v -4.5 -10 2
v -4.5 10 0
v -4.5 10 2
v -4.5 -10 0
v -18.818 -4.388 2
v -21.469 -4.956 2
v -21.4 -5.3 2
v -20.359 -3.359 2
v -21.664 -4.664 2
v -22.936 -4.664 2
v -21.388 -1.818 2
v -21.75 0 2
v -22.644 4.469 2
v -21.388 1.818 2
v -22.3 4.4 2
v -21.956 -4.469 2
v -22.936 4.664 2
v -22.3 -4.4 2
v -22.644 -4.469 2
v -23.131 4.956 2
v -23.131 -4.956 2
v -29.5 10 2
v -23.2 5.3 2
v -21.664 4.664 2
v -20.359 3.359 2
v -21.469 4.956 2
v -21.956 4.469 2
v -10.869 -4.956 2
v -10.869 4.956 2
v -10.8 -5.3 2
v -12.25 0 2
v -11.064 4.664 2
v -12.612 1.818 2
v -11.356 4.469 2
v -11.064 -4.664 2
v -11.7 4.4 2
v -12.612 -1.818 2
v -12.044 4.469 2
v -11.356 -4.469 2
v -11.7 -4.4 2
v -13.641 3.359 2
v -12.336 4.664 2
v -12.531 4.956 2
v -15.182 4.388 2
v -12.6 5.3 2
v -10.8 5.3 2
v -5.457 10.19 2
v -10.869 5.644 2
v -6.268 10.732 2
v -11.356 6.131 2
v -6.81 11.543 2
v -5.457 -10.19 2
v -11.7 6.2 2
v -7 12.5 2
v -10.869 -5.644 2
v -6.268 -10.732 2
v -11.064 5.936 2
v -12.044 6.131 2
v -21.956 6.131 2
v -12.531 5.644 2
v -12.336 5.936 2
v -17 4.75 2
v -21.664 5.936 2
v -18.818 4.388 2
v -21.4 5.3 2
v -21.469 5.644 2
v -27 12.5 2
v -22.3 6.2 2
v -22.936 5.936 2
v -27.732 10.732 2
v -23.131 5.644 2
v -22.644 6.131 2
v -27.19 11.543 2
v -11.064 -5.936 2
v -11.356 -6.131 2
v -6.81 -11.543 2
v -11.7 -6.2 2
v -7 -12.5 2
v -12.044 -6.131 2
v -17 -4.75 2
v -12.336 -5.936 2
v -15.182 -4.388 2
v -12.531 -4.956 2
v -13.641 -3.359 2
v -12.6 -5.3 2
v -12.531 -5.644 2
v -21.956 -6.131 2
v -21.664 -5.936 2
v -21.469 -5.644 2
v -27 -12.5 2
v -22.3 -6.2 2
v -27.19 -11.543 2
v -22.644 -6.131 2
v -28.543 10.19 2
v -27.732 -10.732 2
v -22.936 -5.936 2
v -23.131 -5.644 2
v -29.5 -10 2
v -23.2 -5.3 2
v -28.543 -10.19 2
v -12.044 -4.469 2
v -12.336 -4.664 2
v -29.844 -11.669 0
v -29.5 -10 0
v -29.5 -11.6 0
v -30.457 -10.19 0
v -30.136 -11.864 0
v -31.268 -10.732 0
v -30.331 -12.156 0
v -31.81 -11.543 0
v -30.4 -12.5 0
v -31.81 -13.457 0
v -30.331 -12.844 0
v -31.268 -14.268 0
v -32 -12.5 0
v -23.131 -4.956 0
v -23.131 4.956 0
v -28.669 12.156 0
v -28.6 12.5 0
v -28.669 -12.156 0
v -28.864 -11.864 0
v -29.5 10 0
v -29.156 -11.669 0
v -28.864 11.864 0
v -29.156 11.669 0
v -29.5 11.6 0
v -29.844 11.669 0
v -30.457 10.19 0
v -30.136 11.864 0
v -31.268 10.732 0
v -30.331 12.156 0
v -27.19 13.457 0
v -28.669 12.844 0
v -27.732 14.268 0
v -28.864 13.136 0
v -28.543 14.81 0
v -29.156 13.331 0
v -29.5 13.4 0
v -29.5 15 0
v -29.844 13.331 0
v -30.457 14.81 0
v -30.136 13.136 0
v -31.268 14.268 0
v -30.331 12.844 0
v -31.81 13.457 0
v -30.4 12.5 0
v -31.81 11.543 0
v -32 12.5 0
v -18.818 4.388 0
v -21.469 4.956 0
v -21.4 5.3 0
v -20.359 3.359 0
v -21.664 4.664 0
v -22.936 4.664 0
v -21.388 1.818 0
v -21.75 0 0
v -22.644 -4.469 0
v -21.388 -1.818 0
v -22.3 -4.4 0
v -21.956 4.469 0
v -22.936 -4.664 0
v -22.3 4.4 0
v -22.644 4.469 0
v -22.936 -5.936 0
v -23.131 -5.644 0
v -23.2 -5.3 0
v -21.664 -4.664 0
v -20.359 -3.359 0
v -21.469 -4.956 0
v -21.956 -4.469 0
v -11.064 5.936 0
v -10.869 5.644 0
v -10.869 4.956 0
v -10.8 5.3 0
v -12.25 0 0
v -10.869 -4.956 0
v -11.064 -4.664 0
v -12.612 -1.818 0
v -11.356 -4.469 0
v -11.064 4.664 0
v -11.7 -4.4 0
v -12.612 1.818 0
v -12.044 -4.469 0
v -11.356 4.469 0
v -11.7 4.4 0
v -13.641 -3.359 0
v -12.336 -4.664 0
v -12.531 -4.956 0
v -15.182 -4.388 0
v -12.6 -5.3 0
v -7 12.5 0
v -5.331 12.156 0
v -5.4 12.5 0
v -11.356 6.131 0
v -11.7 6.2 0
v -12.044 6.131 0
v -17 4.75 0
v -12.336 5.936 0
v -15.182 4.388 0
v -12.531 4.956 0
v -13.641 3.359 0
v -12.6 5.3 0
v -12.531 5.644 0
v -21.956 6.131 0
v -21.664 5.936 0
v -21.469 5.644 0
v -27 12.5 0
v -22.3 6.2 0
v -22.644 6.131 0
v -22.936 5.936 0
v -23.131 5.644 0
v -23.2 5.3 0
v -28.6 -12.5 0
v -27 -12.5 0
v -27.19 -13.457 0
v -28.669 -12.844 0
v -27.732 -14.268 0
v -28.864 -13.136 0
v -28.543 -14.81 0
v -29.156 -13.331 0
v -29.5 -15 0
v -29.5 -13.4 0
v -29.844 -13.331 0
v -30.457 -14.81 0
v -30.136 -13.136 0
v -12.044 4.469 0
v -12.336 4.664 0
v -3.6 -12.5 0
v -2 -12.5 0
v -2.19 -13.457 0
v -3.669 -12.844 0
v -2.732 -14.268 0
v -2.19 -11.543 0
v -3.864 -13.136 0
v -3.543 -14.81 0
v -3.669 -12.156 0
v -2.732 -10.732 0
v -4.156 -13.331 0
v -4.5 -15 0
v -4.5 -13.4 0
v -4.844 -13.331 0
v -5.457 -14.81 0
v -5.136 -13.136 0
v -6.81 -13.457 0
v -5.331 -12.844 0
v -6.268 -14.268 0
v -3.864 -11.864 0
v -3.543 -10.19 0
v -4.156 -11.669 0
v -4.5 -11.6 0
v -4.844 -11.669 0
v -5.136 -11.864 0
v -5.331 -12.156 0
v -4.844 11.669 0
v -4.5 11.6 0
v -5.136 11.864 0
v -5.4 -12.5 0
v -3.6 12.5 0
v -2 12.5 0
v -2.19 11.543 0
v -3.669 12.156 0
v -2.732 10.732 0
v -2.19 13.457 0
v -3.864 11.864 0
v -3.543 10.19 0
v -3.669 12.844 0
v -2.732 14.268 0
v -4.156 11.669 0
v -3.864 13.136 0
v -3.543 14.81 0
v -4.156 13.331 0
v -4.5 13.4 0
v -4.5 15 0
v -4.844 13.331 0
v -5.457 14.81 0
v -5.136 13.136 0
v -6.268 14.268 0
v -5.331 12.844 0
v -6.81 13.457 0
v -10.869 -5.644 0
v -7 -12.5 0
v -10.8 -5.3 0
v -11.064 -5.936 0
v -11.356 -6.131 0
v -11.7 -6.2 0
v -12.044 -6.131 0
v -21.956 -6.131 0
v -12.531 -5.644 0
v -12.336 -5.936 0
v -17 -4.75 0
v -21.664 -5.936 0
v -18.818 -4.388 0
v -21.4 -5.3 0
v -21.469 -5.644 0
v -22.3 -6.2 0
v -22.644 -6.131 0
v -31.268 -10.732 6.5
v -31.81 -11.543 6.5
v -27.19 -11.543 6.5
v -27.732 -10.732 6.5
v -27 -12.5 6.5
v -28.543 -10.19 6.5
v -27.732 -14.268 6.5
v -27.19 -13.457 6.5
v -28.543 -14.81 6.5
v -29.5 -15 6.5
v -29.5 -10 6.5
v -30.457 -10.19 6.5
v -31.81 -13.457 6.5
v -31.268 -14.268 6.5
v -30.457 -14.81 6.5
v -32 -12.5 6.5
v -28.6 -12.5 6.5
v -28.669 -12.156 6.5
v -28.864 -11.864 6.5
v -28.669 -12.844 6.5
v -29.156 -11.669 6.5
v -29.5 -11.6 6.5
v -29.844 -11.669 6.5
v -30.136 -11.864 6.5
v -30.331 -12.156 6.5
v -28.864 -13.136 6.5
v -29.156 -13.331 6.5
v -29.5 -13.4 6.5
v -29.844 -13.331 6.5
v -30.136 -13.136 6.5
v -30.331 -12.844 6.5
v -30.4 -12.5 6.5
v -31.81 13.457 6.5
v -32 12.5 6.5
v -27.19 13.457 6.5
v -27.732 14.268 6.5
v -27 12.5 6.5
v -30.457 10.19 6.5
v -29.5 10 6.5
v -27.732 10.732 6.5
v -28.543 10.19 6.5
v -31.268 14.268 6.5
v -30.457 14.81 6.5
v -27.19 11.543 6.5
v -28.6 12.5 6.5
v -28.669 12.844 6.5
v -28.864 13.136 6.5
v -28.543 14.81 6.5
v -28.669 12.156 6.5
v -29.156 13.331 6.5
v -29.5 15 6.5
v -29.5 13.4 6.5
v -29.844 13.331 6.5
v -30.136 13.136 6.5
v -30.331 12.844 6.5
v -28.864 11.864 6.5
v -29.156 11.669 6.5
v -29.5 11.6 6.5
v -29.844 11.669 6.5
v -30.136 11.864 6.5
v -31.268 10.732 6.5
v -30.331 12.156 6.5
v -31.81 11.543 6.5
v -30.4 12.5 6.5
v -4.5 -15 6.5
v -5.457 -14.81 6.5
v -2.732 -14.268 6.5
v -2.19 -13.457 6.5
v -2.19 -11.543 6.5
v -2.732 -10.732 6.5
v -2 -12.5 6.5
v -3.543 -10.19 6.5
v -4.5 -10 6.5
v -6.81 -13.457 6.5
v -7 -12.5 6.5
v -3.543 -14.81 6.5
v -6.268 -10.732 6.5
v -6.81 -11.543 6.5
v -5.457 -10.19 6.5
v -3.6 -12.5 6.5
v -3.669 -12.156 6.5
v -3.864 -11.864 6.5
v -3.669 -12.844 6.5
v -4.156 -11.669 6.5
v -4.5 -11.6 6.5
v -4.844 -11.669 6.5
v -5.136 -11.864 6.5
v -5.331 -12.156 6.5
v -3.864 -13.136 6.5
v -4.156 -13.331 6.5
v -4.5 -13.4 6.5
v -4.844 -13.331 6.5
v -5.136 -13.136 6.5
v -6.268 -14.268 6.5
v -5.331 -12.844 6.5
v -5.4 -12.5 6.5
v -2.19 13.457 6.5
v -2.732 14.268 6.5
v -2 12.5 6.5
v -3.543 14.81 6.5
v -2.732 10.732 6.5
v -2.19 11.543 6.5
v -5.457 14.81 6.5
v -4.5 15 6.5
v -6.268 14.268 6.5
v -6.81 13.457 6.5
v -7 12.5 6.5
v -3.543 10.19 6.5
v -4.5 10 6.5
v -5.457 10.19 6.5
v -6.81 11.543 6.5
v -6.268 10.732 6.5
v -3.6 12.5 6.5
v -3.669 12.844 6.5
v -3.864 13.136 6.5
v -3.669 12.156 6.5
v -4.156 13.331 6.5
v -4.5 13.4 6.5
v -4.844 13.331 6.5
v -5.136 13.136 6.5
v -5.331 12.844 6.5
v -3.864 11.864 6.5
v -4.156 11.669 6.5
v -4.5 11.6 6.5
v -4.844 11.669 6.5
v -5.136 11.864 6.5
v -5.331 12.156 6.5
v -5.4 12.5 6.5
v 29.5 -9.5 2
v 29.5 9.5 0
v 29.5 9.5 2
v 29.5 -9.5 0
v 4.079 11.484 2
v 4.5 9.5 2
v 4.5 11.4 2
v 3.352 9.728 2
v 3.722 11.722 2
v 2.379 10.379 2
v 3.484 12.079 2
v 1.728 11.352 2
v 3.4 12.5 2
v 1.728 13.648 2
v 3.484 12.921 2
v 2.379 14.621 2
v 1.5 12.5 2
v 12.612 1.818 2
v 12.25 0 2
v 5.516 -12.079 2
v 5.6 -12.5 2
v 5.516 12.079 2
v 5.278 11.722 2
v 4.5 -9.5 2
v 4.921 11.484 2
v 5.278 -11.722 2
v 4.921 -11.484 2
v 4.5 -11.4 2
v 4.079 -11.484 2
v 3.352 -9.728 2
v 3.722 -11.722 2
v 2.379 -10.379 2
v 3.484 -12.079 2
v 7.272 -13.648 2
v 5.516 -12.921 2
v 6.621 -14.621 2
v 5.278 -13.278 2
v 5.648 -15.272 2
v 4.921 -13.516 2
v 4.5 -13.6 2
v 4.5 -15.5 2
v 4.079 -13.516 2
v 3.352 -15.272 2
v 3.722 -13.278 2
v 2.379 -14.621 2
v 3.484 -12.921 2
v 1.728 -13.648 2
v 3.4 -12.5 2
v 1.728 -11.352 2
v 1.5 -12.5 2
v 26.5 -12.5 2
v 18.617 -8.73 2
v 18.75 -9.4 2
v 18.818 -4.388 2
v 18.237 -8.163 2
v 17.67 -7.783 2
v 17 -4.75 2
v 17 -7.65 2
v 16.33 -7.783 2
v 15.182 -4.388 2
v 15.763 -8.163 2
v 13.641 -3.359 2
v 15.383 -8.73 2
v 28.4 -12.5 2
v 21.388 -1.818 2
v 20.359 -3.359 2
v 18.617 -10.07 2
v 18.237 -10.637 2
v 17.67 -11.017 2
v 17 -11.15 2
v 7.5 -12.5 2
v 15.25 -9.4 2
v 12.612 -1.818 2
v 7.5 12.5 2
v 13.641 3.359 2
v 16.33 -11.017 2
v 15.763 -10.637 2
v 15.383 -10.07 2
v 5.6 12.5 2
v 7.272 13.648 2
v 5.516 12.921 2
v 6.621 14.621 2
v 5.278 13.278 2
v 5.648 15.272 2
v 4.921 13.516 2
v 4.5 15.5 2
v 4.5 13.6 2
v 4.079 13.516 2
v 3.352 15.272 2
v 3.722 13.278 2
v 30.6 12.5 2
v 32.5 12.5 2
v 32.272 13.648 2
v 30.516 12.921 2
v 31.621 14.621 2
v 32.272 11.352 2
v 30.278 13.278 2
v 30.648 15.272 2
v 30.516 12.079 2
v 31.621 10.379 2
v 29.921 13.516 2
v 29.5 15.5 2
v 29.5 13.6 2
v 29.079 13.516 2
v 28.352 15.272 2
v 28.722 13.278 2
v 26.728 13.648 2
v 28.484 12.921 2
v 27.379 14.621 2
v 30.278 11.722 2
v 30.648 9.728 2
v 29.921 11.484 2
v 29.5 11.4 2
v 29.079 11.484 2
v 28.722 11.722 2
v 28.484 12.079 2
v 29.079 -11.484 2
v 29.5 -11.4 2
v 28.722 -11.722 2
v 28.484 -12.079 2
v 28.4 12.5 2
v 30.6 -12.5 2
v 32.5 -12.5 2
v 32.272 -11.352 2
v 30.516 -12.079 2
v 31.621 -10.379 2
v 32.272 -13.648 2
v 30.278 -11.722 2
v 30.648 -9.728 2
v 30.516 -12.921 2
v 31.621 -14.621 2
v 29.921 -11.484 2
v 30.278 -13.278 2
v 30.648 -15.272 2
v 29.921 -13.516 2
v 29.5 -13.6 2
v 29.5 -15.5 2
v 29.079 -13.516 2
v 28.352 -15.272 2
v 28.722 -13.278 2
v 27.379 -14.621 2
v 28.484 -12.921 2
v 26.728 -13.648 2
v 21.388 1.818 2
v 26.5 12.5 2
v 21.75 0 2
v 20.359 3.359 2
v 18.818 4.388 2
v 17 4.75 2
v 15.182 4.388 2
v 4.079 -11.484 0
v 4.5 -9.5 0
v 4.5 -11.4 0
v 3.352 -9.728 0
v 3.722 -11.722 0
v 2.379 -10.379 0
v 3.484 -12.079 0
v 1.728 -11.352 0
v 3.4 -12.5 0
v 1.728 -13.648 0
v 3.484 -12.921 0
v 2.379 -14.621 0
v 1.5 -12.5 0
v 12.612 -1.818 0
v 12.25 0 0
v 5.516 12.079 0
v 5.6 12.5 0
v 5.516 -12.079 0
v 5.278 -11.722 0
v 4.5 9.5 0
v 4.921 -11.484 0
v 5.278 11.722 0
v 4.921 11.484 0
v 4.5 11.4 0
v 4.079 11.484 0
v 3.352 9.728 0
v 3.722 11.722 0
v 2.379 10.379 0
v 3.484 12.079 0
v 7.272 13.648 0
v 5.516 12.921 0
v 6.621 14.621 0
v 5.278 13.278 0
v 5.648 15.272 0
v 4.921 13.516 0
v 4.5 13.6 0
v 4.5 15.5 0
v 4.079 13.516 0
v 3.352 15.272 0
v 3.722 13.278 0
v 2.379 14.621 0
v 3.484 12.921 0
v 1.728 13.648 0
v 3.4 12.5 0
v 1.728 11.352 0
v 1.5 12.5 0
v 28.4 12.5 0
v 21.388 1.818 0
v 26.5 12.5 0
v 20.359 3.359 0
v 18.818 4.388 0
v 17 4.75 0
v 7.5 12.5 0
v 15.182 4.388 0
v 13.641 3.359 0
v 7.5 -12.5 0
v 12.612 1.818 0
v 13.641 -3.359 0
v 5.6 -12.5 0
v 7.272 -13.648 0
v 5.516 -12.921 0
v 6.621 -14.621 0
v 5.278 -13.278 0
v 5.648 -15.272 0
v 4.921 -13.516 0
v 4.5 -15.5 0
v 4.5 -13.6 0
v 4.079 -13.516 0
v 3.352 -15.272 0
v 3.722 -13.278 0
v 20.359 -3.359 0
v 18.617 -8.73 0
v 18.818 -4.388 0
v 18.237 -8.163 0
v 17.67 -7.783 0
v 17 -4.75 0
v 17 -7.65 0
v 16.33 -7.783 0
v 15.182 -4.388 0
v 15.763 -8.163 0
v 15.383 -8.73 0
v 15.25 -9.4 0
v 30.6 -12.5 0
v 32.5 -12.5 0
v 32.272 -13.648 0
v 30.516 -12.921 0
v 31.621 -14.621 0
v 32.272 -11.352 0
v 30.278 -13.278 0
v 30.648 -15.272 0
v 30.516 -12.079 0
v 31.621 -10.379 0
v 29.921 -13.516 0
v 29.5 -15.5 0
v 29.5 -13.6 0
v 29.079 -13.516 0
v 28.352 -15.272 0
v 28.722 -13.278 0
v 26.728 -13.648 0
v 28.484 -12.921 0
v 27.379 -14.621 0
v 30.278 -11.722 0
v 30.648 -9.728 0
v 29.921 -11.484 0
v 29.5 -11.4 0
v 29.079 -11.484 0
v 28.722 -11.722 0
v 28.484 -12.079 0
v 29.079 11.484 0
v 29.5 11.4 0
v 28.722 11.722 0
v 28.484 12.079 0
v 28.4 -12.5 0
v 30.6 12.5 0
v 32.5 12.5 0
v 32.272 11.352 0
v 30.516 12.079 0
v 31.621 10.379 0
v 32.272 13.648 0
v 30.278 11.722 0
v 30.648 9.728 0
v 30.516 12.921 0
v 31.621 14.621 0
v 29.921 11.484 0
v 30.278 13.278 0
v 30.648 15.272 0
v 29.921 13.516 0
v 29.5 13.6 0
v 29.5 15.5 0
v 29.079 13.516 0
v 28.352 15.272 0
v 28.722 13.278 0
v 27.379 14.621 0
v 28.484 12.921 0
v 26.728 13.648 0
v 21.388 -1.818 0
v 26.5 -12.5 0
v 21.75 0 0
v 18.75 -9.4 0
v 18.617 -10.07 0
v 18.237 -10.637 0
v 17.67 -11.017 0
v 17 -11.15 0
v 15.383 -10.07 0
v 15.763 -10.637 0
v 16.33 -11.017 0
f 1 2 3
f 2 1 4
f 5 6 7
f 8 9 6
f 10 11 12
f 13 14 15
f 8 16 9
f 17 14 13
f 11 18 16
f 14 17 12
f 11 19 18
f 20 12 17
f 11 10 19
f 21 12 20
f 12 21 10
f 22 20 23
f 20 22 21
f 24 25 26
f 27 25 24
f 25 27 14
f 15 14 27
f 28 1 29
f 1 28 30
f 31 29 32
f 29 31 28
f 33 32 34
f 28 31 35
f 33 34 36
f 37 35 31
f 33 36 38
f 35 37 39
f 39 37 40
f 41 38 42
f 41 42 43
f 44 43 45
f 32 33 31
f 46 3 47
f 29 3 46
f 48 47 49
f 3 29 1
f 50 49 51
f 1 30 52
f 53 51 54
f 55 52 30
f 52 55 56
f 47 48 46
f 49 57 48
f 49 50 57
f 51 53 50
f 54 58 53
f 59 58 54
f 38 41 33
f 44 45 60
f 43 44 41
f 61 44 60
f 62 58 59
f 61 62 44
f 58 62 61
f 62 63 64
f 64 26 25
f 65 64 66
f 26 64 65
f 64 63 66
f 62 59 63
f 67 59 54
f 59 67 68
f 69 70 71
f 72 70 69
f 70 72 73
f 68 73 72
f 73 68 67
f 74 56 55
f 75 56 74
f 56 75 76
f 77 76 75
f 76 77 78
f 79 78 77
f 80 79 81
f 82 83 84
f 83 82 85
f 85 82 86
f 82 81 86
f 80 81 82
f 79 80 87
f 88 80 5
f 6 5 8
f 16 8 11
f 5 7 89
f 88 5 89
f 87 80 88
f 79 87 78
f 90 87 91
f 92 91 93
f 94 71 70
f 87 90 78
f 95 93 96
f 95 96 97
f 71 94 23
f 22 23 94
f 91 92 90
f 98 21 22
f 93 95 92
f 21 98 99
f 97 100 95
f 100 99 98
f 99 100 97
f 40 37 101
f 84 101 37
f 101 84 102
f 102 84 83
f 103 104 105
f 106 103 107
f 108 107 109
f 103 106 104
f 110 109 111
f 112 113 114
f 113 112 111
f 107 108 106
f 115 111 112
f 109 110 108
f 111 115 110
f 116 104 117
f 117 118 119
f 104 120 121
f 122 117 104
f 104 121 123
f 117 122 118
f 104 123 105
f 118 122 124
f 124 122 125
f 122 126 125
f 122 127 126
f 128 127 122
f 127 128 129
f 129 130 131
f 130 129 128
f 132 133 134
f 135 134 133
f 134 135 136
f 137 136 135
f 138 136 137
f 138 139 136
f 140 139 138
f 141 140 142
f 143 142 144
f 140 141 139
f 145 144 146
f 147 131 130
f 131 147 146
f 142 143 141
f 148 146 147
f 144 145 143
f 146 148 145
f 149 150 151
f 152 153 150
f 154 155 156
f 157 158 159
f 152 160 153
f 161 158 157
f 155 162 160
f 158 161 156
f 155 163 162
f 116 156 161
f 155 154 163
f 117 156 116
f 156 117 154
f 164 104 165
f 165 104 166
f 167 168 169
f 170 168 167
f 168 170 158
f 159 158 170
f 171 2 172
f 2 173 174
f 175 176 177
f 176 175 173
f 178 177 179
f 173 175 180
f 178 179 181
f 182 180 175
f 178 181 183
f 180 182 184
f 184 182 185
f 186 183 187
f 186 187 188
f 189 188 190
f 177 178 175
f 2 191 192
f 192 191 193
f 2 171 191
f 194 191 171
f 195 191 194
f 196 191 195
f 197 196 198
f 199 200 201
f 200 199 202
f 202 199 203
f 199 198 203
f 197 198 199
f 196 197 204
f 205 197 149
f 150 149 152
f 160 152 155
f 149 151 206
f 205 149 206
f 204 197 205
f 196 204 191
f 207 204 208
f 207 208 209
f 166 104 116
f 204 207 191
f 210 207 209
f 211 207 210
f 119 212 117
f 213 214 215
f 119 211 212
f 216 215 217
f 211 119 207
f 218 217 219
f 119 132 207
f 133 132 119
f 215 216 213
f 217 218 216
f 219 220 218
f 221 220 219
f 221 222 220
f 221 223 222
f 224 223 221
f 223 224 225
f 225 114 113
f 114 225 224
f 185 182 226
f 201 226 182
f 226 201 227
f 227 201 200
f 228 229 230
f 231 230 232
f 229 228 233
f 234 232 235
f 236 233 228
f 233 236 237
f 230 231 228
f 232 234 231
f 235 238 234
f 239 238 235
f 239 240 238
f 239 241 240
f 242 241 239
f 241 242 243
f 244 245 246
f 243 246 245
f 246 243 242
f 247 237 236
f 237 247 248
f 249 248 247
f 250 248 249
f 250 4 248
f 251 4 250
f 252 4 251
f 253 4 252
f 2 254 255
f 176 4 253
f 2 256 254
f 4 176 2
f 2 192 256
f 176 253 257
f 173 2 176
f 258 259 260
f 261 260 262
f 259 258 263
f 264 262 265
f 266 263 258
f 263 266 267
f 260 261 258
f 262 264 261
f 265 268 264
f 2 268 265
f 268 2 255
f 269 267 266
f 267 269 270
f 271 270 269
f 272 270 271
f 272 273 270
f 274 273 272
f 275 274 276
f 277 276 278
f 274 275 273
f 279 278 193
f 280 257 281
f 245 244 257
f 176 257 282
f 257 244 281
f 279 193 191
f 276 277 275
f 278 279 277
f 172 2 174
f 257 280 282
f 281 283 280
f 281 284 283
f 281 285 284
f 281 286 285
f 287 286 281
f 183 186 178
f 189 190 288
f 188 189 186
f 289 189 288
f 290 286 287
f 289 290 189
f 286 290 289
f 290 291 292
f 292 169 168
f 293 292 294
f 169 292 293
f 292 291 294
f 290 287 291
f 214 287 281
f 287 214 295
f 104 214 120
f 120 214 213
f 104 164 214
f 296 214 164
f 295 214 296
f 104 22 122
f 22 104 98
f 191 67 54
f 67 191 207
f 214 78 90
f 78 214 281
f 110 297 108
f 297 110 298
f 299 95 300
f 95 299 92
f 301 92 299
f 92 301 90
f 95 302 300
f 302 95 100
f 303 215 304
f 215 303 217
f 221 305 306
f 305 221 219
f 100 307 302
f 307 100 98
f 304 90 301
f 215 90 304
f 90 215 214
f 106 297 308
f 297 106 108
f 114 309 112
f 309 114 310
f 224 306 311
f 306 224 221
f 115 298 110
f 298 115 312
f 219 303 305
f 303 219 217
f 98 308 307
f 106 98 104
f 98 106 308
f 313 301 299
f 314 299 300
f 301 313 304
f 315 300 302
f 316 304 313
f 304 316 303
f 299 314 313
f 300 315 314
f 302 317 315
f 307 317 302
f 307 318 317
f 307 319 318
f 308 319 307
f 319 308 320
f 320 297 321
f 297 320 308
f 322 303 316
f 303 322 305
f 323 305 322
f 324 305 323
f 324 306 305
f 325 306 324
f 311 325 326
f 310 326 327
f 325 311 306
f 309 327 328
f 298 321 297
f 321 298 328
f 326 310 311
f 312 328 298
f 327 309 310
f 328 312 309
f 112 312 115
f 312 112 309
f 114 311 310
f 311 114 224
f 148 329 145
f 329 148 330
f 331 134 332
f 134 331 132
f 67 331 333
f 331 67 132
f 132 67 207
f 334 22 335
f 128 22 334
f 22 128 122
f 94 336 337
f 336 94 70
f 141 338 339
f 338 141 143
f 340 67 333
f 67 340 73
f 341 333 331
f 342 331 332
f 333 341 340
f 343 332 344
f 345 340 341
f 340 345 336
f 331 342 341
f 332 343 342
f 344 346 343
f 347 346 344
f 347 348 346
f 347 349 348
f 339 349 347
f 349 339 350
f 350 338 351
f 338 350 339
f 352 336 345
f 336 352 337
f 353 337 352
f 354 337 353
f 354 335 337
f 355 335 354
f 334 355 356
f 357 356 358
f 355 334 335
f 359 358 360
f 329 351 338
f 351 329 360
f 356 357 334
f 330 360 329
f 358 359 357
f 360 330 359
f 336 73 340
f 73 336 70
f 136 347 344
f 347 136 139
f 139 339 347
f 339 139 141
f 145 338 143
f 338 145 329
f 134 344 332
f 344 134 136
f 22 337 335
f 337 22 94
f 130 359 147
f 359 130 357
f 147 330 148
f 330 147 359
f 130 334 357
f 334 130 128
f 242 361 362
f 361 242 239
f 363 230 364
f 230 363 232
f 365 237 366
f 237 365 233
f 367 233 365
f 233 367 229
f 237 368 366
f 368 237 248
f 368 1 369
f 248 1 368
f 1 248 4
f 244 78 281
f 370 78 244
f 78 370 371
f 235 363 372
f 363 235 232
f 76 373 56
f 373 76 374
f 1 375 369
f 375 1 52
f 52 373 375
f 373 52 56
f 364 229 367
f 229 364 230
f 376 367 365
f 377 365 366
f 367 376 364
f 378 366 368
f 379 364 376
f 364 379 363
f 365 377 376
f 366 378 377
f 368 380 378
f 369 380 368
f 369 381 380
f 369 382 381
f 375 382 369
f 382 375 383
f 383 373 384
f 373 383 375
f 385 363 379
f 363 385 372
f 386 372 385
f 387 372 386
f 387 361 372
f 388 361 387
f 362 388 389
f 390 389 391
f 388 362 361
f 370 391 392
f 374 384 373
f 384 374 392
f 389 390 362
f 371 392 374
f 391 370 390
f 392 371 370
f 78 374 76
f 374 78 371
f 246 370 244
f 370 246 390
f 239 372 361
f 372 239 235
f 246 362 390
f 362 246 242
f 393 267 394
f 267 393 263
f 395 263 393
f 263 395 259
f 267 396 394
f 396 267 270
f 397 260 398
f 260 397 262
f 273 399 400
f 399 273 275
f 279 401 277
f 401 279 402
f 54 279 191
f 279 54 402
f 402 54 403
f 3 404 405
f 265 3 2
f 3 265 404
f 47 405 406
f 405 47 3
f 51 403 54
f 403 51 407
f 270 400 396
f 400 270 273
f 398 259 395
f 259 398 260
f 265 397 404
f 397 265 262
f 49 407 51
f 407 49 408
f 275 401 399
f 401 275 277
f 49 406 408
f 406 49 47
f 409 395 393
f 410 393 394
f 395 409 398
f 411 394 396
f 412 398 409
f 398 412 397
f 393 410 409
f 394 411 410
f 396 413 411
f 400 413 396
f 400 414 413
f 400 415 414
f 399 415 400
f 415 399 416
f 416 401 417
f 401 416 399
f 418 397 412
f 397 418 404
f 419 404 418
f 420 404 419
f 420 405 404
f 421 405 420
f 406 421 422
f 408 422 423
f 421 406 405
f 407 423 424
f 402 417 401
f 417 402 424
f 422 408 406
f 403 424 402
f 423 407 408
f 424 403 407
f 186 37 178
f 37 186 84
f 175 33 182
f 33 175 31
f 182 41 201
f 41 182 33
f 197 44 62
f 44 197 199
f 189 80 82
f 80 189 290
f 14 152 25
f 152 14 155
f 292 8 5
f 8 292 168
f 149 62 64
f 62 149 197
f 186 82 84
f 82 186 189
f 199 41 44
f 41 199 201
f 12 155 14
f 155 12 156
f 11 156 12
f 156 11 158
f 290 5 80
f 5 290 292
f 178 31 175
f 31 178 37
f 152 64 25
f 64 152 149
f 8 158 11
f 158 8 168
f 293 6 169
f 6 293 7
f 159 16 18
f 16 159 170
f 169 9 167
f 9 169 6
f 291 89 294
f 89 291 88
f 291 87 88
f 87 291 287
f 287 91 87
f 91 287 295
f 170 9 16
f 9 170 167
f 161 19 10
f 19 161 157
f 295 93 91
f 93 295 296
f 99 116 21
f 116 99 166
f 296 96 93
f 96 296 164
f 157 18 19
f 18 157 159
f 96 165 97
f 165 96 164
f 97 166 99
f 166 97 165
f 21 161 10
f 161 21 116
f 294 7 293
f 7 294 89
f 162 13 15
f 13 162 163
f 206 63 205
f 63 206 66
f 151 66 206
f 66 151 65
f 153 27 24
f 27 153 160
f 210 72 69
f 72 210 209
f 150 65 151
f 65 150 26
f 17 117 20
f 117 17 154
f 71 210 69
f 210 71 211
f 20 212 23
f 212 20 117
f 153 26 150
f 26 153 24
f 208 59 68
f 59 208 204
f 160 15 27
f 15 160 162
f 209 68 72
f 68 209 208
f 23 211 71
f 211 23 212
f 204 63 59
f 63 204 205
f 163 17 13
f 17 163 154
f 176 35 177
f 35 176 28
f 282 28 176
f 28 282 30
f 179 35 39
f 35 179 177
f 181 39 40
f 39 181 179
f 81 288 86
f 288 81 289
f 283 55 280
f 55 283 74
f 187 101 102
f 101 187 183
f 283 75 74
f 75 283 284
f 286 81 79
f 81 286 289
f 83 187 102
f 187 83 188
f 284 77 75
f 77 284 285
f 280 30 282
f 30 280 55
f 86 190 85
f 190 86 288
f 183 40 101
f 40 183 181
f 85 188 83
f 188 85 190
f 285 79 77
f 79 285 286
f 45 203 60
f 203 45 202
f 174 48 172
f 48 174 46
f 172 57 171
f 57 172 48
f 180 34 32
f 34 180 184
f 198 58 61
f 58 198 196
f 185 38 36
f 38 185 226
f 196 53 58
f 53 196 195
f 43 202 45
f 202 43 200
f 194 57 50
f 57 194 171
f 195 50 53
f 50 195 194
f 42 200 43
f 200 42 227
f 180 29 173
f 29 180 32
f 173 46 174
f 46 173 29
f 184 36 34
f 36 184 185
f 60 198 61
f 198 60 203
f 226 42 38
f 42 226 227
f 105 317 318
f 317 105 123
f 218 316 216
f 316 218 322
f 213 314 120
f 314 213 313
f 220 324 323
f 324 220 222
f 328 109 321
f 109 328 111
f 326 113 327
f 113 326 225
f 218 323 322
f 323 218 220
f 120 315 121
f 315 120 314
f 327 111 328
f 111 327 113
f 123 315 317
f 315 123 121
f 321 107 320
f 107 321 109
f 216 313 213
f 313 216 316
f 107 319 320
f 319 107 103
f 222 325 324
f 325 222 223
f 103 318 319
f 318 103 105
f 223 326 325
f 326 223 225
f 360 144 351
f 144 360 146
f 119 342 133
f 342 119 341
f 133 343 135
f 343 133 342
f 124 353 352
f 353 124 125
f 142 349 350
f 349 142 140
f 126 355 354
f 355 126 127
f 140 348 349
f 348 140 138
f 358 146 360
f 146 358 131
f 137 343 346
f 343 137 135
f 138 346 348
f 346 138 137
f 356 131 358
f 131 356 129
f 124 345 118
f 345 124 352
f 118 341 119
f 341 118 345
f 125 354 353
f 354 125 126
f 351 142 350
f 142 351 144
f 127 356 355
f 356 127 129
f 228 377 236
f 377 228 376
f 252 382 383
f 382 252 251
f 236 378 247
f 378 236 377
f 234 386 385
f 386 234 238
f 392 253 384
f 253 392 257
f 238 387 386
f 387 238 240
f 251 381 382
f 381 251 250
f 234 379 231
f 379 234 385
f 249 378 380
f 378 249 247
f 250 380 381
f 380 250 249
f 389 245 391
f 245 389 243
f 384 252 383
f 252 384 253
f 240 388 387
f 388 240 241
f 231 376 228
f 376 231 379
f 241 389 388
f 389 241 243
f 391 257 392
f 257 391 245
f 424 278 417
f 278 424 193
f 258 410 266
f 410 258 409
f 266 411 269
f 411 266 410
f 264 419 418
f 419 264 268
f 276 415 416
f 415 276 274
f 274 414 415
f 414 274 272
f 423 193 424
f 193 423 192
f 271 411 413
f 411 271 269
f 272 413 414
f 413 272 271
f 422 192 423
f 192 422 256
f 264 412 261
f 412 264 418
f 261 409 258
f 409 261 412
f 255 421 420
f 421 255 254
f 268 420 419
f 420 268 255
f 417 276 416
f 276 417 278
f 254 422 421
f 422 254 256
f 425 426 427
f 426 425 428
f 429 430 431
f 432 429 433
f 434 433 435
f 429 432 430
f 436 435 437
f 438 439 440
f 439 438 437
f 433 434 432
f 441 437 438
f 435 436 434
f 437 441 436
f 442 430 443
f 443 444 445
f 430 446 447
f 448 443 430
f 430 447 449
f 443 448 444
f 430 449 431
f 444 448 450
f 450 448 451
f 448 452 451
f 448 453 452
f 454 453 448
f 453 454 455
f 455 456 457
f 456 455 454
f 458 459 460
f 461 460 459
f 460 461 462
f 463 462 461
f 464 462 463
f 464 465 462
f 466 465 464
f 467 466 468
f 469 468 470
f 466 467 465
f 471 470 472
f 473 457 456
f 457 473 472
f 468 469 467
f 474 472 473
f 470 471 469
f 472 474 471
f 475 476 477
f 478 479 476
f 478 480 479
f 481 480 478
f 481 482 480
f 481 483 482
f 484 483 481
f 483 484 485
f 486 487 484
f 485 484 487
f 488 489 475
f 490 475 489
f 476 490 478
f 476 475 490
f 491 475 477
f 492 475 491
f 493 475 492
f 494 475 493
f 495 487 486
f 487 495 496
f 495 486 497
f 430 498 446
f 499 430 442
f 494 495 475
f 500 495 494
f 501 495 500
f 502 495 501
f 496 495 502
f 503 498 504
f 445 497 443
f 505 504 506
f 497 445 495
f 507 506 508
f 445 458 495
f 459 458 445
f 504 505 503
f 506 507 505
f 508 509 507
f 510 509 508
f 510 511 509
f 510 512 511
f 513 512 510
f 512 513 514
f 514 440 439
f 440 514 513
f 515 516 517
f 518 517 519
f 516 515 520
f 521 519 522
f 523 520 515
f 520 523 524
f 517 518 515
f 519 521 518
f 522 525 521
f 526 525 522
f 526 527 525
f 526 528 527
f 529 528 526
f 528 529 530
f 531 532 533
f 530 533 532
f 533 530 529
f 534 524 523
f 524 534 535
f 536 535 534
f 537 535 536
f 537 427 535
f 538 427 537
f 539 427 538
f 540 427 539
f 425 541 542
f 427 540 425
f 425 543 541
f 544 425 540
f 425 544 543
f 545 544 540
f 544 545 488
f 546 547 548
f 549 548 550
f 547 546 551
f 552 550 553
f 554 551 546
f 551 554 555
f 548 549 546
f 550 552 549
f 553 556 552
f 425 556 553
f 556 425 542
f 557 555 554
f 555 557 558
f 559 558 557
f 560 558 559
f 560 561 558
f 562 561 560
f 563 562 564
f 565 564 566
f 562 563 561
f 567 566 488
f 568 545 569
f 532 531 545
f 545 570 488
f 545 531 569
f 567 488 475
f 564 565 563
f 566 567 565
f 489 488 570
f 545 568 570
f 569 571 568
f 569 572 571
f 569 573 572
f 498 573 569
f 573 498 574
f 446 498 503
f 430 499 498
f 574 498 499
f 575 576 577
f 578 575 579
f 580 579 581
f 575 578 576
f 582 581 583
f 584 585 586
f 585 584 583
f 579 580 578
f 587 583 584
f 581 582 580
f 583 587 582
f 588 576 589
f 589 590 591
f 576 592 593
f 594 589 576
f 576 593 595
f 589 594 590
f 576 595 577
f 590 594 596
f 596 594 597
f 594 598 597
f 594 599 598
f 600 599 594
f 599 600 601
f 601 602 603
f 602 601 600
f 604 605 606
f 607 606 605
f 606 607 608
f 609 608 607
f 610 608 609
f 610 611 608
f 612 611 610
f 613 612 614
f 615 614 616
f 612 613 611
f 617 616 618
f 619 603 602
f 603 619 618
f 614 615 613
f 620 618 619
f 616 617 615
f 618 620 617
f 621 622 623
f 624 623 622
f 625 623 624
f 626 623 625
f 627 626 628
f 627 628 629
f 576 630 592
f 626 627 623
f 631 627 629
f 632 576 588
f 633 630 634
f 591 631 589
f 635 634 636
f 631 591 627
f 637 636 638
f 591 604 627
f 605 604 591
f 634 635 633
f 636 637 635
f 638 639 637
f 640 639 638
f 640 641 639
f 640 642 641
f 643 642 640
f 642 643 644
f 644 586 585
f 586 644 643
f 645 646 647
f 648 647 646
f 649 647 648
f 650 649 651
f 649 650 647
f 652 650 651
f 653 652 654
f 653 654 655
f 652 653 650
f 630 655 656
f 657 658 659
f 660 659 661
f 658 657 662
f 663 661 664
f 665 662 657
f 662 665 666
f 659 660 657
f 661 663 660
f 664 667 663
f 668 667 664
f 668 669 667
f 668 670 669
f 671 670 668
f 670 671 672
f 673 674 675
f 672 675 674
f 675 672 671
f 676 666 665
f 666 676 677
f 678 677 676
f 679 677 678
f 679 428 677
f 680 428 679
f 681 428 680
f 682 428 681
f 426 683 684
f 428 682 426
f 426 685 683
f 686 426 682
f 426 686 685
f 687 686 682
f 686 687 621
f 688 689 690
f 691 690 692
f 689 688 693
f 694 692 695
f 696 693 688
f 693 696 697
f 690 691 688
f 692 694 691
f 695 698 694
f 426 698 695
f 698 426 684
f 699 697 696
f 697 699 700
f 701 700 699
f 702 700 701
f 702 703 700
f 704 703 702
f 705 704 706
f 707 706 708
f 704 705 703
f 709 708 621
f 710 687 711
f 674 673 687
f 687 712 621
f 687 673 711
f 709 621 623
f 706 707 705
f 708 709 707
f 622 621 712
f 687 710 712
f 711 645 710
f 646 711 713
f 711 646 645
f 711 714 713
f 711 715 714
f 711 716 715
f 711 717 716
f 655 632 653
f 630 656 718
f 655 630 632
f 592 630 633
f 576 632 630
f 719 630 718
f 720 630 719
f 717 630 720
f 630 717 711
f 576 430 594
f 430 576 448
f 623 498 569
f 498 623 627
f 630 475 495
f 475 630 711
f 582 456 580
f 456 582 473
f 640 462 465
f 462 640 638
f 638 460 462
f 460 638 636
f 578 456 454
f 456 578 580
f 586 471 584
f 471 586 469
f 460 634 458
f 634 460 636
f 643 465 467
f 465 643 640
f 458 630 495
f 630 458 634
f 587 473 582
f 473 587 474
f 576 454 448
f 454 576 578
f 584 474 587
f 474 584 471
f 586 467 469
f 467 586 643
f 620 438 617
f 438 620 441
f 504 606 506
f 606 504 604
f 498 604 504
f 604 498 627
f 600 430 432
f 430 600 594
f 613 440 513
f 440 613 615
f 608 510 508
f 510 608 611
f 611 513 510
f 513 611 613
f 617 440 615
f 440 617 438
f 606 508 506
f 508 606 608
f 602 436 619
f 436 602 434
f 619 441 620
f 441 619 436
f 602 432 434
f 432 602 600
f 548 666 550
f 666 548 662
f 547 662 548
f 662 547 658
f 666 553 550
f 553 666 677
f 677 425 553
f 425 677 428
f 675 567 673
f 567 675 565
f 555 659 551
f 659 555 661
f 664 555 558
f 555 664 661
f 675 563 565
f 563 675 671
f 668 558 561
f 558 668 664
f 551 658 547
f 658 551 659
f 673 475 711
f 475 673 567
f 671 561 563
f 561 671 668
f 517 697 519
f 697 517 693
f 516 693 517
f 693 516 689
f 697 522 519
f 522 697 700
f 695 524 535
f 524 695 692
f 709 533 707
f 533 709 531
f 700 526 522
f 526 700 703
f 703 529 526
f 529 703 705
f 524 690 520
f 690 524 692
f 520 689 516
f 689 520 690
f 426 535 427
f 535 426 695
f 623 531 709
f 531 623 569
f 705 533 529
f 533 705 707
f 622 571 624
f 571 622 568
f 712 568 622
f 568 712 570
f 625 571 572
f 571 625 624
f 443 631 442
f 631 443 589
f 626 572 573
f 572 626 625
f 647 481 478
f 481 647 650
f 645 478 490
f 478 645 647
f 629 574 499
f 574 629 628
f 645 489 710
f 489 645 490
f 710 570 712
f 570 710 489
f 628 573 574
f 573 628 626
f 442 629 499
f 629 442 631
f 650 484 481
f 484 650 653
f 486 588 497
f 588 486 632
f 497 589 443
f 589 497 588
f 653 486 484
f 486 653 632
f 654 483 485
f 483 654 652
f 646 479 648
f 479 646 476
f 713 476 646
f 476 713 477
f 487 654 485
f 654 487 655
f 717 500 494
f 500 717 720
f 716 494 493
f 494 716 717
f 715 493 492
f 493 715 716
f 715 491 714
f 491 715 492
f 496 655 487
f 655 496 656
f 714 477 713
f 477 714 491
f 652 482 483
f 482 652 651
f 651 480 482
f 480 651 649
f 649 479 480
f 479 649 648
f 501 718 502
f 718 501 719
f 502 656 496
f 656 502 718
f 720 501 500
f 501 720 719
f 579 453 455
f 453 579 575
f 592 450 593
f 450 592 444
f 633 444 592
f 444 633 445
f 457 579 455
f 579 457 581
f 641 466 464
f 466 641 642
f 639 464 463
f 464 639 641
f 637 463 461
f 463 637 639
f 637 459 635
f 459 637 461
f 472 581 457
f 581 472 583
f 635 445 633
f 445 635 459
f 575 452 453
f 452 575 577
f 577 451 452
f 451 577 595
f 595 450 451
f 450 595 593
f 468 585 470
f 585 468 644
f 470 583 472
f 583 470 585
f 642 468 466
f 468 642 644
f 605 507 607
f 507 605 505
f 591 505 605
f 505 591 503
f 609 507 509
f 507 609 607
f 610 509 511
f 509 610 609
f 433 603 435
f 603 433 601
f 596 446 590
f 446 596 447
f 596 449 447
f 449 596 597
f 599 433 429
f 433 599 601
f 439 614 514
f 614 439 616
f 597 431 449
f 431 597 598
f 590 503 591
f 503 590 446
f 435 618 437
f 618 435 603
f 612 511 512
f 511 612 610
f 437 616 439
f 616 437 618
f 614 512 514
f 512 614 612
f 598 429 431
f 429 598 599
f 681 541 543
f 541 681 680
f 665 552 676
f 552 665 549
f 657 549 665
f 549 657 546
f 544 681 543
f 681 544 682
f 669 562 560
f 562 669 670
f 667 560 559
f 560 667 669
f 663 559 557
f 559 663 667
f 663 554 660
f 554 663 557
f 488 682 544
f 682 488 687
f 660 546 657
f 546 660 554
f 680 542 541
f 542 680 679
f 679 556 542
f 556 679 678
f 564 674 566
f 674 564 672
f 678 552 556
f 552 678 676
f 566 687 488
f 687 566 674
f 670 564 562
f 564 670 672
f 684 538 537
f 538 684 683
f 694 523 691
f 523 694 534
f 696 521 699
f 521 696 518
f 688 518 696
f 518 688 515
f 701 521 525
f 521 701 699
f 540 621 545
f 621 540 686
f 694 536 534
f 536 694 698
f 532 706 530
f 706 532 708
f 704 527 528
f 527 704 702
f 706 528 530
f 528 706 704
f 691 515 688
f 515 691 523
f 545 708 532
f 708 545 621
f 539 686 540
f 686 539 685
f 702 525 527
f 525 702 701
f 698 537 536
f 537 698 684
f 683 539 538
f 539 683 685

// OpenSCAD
//OpenSCAD-Skript

//Moduldefinition mit Parametern
module rahmen (
//Platte
leno=25,        //Länge u. Breite Platte
hght=2,         //Dicke der Platte
blthgh=6.5,     //Höhe der Baugruppe
dsh=5,          //Durchmesser der Träger
//Schrauben zur Front
FSdst=10.6,     //Schraubenabstand Frontschrauben
dsh1=2.2,       //Schaftdurchmesser
dsh2=1.8,       //Bohrung f. selbstschneidende Schrauben
//Drehschalter
RSWdia=9.5,     //Schaftdurchmesser Drehschalter
RSWdist=9.4,    //Mittenabstand Pin
RSWpin=3.5      //Durchmesser Pin)
)
//Beginn Modul
{
difference(){   //difference 1
union(){        //union 1
difference(){   //difference 2
union(){        //union 2
    //alles, was vor der nächsten geschweiften Klammer steht, wird zusammengefügt (union 2)

//Rahmenkörper
translate([-leno/2,-leno/2,0]) cube([leno,leno,hght]);
//Halterungen Schrauben
translate([-leno/2,-leno/2,0])  cylinder(d=dsh,h=blthgh,$fn=16);
translate([-leno/2,+leno/2,0])  cylinder(d=dsh,h=blthgh,$fn=16);
translate([+leno/2,-leno/2,0])  cylinder(d=dsh,h=blthgh,$fn=16);
translate([+leno/2,+leno/2,0])  cylinder(d=dsh,h=blthgh,$fn=16);
   
}               //union 2 end
    //alles, was vor der nächsten geschweiften Klammer steht, wird davon abgezogen (difference 2)
//Mittenbohrung Welle
translate([0,0,-0.1]) cylinder(d=RSWdia,h=20,$fn=16);
//Schraubenlöcher Front
translate([-FSdst/2,-FSdst/2,-0.1])  cylinder(d=dsh2,h=blthgh,$fn=16);
translate([-FSdst/2,+FSdst/2,-0.1])  cylinder(d=dsh2,h=blthgh,$fn=16);
translate([+FSdst/2,-FSdst/2,-0.1])  cylinder(d=dsh2,h=blthgh,$fn=16);
translate([+FSdst/2,+FSdst/2,-0.1])  cylinder(d=dsh2,h=blthgh,$fn=16);
//Bohrungen Schrauben
translate([-leno/2,-leno/2,-0.1])  cylinder(d=dsh2,h=2*blthgh,$fn=16);
translate([-leno/2,+leno/2,-0.1])  cylinder(d=dsh2,h=2*blthgh,$fn=16);
translate([+leno/2,-leno/2,-0.1])  cylinder(d=dsh2,h=2*blthgh,$fn=16);
translate([+leno/2,+leno/2,-0.1])  cylinder(d=dsh2,h=2*blthgh,$fn=16);

}  //difference 2 end
    //alles, was vor der nächsten geschweiften Klammer steht, wird dazu hinzugefügt (union 1)


}               //union 1 end
    //alles, was vor der nächsten geschweiften Klammer steht, wird davon wieder abgezogen (difference 1)

}               //difference 1 end

}  //module end

//.......................................................

module platte (
//Parameter
//Platte
leno=25,        //Länge u. Breite Platte
hght=2,         //Dicke der Platte
blthgh=6.5,     //Höhe der Baugruppe
dsh=6,          //Durchmesser der Träger
//Schrauben zur Front
dist=11,        //Schraubenabstand Frontschrauben
dsh1=2.2,       //Schaftdurchmesser
dsh2=1.8,       //Bohrung f. selbstschneidende Schrauben
//Drehschalter
RSWdia=9.5,     //Schaftdurchmesser Drehschalter
RSWdist=9.4,    //Mittenabstand Pin
RSWpin=3.5      //Durchmesser Pin)
)
//Beginn Modul
{
difference(){   //difference 1
union(){        //union 1
difference(){   //difference 2
union(){        //union 2
    //alles, was vor der nächsten geschweiften Klammer steht, wird zusammengefügt (union 2)

//Rahmenkörper
translate([-leno/2,-leno/2,0]) cube([leno,leno,hght]);
//Halterungen Schrauben
translate([-leno/2,-leno/2,0])  cylinder(d=dsh,h=hght,$fn=16);
translate([-leno/2,+leno/2,0])  cylinder(d=dsh,h=hght,$fn=16);
translate([+leno/2,-leno/2,0])  cylinder(d=dsh,h=hght,$fn=16);
translate([+leno/2,+leno/2,0])  cylinder(d=dsh,h=hght,$fn=16);
   
}               //union 2 end
    //alles, was vor der nächsten geschweiften Klammer steht, wird davon abgezogen (difference 2)
//Mittenbohrung Welle
translate([0,0,-0.1]) cylinder(d=RSWdia,h=20,$fn=16);
//Fixierung Schalter
translate([0,-RSWdist,-0.1])  cylinder(d=RSWpin,h=blthgh,$fn=16);

//Bohrungen Schrauben
translate([-leno/2,-leno/2,-0.1])  cylinder(d=dsh1,h=2*blthgh,$fn=16);
translate([-leno/2,+leno/2,-0.1])  cylinder(d=dsh1,h=2*blthgh,$fn=16);
translate([+leno/2,-leno/2,-0.1])  cylinder(d=dsh1,h=2*blthgh,$fn=16);
translate([+leno/2,+leno/2,-0.1])  cylinder(d=dsh1,h=2*blthgh,$fn=16);

}  //difference 2 end
    //alles, was vor der nächsten geschweiften Klammer steht, wird dazu hinzugefügt (union 1)


}               //union 1 end
    //alles, was vor der nächsten geschweiften Klammer steht, wird davon wieder abgezogen (difference 1)

}               //difference 1 end

}  //module end


//Hier werden Instanzen des Moduls aufgerufen
translate([-17,0,0]) rahmen();
translate([17,0,0]) platte();
